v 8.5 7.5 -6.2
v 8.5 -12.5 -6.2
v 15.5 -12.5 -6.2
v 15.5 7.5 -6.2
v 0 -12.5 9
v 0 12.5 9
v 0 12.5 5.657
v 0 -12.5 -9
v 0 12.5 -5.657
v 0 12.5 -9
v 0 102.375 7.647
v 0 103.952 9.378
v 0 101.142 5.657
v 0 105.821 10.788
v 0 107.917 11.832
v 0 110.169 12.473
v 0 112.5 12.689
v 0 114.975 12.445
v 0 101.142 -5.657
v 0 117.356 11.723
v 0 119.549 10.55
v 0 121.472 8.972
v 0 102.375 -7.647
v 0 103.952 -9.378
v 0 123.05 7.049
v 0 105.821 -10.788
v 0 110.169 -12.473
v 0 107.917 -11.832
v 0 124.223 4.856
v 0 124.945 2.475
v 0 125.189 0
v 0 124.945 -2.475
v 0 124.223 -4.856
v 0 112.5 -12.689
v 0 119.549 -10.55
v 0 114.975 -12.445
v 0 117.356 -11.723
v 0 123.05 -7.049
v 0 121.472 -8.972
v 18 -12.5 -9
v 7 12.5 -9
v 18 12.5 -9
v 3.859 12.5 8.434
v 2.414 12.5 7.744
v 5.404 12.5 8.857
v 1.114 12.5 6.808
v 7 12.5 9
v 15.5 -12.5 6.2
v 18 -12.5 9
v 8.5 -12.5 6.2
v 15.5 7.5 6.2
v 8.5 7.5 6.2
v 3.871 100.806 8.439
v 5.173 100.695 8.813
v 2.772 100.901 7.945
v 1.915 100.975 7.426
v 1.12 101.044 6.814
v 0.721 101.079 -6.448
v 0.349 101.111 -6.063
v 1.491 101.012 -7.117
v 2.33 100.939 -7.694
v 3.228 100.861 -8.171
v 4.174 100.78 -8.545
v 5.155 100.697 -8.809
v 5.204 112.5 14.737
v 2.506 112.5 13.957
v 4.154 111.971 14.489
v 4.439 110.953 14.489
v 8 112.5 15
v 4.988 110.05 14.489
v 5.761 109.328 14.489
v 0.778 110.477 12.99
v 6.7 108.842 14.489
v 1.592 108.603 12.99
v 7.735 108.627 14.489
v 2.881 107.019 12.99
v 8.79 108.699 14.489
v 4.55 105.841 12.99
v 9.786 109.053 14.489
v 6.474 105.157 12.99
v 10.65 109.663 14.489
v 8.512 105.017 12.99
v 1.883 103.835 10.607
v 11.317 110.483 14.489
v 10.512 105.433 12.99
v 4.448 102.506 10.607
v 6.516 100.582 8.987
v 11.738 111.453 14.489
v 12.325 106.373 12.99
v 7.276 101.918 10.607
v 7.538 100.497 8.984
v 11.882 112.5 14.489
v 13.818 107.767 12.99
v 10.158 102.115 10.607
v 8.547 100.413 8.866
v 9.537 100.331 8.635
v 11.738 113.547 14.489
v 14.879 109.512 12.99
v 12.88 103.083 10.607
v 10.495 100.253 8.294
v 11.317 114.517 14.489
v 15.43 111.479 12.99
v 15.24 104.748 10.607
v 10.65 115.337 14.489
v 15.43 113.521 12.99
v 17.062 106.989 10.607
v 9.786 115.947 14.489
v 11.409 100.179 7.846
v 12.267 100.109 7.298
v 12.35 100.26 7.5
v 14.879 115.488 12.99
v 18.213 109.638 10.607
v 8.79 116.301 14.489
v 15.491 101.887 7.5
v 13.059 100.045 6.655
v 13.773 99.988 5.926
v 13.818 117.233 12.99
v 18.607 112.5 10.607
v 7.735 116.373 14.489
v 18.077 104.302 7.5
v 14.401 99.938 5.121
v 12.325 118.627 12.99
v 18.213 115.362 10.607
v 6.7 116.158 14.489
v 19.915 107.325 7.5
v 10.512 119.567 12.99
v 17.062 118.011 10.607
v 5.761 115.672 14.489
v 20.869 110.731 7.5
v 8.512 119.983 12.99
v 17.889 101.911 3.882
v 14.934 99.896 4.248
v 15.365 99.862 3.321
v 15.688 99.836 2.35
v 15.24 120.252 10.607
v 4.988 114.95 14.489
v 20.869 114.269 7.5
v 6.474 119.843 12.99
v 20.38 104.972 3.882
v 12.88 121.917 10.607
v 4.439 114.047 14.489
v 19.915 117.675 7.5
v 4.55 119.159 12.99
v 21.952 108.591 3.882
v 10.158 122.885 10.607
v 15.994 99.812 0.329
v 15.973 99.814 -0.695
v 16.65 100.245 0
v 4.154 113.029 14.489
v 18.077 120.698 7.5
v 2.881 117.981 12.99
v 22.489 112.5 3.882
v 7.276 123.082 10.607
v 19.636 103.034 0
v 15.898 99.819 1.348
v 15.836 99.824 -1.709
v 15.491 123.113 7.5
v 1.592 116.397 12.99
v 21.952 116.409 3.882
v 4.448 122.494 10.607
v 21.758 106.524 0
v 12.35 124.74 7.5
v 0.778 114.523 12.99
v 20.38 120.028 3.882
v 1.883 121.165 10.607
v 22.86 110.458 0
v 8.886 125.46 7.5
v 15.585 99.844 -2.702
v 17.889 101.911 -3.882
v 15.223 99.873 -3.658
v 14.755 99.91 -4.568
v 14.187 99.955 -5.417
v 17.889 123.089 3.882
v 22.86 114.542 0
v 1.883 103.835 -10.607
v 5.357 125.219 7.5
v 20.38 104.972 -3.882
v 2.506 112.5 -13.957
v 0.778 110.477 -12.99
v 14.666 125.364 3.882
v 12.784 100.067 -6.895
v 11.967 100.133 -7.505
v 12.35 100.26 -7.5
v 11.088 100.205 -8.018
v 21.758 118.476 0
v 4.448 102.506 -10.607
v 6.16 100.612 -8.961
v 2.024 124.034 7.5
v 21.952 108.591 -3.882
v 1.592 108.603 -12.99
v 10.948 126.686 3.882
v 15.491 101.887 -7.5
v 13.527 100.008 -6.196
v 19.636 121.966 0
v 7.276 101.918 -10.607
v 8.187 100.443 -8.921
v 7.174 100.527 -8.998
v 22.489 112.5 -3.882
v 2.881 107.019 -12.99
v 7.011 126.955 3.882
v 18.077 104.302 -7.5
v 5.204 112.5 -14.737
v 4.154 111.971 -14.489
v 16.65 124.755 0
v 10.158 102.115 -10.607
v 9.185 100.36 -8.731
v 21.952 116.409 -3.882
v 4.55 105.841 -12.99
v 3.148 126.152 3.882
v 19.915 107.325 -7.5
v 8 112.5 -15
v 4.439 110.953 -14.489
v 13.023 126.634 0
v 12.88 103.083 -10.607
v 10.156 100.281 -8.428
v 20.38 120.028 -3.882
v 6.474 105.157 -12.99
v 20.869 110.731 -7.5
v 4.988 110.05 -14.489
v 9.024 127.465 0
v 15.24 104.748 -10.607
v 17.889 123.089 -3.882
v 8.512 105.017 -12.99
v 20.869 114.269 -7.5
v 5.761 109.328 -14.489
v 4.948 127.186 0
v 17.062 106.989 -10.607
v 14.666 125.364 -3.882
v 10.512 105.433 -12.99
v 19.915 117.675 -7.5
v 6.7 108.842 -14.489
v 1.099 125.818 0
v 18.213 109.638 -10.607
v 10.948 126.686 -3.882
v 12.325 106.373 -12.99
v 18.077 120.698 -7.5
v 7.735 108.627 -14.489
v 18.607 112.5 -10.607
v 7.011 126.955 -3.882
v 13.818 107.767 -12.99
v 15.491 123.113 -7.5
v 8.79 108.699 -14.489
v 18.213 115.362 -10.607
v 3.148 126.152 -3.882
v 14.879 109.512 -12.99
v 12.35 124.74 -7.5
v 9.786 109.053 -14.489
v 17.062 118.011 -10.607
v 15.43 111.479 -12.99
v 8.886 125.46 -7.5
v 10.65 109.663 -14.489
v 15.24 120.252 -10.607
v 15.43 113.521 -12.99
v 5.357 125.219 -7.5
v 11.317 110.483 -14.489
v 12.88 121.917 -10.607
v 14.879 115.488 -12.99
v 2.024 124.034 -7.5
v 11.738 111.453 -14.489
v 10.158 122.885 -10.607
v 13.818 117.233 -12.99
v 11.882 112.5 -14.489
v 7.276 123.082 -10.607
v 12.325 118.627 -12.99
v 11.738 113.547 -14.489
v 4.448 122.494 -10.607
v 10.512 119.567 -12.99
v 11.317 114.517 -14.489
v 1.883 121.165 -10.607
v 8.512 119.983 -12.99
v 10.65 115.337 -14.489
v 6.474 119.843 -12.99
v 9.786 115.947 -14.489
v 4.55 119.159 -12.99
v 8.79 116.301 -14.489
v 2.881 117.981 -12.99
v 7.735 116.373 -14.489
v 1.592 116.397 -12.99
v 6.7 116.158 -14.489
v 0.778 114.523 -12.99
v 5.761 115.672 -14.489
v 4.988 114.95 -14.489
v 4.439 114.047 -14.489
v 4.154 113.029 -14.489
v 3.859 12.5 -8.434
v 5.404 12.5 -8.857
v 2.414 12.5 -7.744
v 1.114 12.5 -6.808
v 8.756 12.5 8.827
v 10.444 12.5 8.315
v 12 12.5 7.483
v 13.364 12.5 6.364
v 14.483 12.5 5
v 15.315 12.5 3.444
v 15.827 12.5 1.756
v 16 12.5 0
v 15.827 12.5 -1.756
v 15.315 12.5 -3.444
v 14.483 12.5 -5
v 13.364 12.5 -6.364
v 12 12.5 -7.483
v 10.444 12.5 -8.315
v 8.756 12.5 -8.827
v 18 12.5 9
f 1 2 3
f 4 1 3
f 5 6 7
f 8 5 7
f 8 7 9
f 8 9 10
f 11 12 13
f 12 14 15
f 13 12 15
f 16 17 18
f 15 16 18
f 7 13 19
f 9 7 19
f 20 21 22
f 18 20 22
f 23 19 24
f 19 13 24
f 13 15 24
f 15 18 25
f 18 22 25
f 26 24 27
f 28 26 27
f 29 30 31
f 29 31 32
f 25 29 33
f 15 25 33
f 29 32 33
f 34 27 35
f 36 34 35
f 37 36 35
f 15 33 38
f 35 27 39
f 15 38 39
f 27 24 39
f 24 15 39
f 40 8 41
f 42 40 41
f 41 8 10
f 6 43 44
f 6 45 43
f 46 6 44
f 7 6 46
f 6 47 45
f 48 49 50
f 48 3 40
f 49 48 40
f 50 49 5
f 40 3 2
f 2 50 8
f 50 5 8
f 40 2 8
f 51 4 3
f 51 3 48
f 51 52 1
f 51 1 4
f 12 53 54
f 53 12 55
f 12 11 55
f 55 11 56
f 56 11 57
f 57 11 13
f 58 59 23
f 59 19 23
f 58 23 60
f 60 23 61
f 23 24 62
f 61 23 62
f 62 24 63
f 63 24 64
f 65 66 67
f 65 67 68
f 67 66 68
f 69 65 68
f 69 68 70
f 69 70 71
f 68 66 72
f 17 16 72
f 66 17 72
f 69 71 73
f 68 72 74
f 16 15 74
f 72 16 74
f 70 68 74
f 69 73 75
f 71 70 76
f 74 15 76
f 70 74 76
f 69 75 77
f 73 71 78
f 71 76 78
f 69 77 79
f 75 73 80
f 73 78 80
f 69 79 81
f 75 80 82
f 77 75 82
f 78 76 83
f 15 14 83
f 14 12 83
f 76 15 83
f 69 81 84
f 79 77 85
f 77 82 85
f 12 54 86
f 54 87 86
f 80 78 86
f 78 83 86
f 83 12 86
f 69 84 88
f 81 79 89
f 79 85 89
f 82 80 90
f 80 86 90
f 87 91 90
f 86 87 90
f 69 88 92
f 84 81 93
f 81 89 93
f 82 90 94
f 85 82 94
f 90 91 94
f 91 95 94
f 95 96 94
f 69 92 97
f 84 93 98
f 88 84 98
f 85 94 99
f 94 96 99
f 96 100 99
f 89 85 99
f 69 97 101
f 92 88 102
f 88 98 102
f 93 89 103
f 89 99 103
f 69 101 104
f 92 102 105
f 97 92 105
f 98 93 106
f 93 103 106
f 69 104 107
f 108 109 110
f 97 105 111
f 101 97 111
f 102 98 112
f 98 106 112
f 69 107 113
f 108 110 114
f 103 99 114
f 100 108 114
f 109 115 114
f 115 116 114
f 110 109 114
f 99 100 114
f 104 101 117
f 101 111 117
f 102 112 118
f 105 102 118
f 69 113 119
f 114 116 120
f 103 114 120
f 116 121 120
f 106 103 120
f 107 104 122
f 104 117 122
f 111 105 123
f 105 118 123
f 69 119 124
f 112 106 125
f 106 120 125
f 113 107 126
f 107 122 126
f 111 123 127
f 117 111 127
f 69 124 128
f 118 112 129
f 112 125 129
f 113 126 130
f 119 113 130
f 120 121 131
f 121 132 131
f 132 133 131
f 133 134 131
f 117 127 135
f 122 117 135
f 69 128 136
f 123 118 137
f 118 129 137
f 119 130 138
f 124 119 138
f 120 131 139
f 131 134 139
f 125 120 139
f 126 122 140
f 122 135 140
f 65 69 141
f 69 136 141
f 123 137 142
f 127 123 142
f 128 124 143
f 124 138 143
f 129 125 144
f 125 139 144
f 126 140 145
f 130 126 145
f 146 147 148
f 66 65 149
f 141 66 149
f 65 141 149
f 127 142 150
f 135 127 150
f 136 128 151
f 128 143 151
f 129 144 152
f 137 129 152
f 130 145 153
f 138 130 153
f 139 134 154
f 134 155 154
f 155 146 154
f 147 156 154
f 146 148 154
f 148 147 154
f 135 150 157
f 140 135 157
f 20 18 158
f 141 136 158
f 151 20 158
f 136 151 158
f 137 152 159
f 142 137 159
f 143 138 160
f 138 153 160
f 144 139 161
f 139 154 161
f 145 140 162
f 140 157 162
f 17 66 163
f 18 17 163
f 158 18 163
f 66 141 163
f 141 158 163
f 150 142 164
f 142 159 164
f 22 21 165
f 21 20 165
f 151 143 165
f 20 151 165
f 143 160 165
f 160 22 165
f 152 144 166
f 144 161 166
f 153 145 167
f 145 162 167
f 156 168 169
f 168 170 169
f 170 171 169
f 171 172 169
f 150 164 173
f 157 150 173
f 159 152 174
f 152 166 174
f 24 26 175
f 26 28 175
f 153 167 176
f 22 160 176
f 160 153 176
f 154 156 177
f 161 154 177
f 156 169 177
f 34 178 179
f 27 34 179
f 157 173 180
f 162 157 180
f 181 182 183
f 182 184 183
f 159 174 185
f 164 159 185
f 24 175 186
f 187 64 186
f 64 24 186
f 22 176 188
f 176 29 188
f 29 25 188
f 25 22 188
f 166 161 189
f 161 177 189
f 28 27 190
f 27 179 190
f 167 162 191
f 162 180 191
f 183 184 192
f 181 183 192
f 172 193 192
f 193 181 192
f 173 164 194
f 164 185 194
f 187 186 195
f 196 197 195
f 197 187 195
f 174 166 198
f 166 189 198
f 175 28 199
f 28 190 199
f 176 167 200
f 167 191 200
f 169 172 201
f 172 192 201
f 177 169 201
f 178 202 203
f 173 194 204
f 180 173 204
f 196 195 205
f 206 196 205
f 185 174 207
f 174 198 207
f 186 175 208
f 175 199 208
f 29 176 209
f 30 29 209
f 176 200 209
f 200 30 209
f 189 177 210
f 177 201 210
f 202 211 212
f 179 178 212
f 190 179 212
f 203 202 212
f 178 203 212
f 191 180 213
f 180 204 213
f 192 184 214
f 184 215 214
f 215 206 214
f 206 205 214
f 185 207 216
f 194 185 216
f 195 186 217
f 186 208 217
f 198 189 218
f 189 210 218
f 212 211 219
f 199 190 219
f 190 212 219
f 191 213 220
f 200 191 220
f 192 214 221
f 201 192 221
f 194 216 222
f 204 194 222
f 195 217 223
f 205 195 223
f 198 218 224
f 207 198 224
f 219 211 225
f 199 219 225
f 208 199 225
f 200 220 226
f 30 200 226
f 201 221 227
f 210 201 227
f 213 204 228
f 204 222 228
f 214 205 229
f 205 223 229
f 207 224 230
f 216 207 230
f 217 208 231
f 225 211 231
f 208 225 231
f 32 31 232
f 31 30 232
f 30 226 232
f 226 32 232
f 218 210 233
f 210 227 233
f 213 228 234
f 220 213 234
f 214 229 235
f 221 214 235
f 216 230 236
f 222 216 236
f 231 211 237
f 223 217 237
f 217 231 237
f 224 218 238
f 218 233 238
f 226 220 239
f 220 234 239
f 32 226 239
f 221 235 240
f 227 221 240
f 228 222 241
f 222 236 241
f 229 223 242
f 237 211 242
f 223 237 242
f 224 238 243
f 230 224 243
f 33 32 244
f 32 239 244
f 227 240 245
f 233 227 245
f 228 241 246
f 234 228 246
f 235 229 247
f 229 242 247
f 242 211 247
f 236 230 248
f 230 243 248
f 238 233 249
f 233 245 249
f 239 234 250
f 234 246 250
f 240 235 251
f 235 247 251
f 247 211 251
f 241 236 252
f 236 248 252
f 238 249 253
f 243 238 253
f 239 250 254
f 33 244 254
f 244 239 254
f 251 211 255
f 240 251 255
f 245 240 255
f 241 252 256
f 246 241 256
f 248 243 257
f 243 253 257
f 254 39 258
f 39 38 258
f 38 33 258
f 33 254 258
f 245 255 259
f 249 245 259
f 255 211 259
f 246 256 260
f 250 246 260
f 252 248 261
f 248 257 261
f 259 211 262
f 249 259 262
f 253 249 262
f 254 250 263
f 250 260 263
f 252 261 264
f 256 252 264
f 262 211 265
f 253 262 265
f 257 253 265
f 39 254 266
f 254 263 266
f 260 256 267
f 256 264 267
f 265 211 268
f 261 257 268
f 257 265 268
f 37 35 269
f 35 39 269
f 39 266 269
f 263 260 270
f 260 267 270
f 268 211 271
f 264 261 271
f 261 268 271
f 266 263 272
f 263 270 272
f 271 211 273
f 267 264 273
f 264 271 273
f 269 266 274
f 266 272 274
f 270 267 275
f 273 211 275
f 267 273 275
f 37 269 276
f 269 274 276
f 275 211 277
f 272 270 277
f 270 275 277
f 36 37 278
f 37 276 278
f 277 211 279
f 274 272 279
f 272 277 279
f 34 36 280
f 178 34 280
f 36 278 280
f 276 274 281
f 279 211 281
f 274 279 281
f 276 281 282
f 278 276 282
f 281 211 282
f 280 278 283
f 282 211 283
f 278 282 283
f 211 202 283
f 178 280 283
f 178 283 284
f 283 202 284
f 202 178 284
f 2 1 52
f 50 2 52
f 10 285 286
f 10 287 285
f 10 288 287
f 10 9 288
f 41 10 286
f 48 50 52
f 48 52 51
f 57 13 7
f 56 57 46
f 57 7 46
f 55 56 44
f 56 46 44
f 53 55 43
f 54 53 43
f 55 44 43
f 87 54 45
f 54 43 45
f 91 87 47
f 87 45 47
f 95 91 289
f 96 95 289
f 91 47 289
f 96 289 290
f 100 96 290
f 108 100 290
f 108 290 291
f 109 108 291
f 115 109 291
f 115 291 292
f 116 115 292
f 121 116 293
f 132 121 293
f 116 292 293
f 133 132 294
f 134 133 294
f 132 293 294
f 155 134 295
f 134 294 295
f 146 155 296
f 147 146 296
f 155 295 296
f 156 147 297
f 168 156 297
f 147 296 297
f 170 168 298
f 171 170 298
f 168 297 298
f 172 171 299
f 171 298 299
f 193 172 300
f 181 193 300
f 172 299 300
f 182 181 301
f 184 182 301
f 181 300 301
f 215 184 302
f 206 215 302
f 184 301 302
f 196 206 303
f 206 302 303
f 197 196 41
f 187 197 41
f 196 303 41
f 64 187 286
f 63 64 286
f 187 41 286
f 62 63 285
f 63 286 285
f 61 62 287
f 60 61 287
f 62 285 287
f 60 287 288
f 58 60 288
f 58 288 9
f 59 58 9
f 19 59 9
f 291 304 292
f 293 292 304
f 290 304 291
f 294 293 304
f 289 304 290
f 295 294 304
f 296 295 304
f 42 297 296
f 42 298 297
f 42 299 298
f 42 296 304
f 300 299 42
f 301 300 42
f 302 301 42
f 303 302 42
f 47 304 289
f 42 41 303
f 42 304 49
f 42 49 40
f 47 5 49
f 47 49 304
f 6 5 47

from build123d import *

# Parameters (mm, degrees)
SKETCH1_W           = 18
SKETCH1_H           = 25
BOSS_EXTRUDE1_DEPTH = 18
SKETCH2_W           = 7
SKETCH2_H           = 12.4
CUT_EXTRUDE1_DEPTH  = 20
BOSS_EXTRUDE2_DEPTH = 100
CUT_EXTRUDE2_DEPTH  = 100


with BuildPart() as part:
    # Sketch1 → Boss-Extrude1 (new body)
    with BuildSketch(Plane(origin=(0, 0, 0), x_dir=(0, 0, -1), z_dir=(1, 0, 0))):
        Rectangle(SKETCH1_W, SKETCH1_H)
    extrude(amount=BOSS_EXTRUDE1_DEPTH)

    # Sketch2 → Cut-Extrude1 (cut)
    with BuildSketch(Plane.XZ.offset(12.5)):
        with Locations((12, 0)):
            Rectangle(SKETCH2_W, SKETCH2_H)
    extrude(amount=-CUT_EXTRUDE1_DEPTH, mode=Mode.SUBTRACT)

    # Sketch3 → Boss-Extrude2 (add)
    with BuildSketch(Plane(origin=(0, 12.5, 0), x_dir=(1, 0, 0), z_dir=(0, 1, 0))):
        with BuildLine():
            Line((0, 5.656854249), (0, -5.656854249))
            ThreePointArc((0, -5.656854249), (16, 0), (0, 5.656854249))
        make_face()
    extrude(amount=BOSS_EXTRUDE2_DEPTH)

    # Sketch6 → Revolve2 (revolve)
    with BuildSketch(Plane(origin=(0, 112.5, 0), x_dir=(1, 0, 0), z_dir=(0, 1, 0))):
        with BuildLine():
            Line((8, 15), (8, -15))
            ThreePointArc((8, -15), (-7, 0), (8, 15))
        make_face()
    revolve(axis=Axis((8, 112.5, -15), (0, 0, 1)))

    # Sketch7 → Cut-Extrude2 (cut)
    with BuildSketch(Plane.ZY):
        with BuildLine():
            ThreePointArc((-5.656854249, 101.142183308), (0, 203.728611238), (5.656854249, 101.142183308))
            ThreePointArc((5.656854249, 101.142183308), (0, 99.81142246), (-5.656854249, 101.142183308))
        make_face()
    extrude(amount=CUT_EXTRUDE2_DEPTH, mode=Mode.SUBTRACT)


solid = part.part
